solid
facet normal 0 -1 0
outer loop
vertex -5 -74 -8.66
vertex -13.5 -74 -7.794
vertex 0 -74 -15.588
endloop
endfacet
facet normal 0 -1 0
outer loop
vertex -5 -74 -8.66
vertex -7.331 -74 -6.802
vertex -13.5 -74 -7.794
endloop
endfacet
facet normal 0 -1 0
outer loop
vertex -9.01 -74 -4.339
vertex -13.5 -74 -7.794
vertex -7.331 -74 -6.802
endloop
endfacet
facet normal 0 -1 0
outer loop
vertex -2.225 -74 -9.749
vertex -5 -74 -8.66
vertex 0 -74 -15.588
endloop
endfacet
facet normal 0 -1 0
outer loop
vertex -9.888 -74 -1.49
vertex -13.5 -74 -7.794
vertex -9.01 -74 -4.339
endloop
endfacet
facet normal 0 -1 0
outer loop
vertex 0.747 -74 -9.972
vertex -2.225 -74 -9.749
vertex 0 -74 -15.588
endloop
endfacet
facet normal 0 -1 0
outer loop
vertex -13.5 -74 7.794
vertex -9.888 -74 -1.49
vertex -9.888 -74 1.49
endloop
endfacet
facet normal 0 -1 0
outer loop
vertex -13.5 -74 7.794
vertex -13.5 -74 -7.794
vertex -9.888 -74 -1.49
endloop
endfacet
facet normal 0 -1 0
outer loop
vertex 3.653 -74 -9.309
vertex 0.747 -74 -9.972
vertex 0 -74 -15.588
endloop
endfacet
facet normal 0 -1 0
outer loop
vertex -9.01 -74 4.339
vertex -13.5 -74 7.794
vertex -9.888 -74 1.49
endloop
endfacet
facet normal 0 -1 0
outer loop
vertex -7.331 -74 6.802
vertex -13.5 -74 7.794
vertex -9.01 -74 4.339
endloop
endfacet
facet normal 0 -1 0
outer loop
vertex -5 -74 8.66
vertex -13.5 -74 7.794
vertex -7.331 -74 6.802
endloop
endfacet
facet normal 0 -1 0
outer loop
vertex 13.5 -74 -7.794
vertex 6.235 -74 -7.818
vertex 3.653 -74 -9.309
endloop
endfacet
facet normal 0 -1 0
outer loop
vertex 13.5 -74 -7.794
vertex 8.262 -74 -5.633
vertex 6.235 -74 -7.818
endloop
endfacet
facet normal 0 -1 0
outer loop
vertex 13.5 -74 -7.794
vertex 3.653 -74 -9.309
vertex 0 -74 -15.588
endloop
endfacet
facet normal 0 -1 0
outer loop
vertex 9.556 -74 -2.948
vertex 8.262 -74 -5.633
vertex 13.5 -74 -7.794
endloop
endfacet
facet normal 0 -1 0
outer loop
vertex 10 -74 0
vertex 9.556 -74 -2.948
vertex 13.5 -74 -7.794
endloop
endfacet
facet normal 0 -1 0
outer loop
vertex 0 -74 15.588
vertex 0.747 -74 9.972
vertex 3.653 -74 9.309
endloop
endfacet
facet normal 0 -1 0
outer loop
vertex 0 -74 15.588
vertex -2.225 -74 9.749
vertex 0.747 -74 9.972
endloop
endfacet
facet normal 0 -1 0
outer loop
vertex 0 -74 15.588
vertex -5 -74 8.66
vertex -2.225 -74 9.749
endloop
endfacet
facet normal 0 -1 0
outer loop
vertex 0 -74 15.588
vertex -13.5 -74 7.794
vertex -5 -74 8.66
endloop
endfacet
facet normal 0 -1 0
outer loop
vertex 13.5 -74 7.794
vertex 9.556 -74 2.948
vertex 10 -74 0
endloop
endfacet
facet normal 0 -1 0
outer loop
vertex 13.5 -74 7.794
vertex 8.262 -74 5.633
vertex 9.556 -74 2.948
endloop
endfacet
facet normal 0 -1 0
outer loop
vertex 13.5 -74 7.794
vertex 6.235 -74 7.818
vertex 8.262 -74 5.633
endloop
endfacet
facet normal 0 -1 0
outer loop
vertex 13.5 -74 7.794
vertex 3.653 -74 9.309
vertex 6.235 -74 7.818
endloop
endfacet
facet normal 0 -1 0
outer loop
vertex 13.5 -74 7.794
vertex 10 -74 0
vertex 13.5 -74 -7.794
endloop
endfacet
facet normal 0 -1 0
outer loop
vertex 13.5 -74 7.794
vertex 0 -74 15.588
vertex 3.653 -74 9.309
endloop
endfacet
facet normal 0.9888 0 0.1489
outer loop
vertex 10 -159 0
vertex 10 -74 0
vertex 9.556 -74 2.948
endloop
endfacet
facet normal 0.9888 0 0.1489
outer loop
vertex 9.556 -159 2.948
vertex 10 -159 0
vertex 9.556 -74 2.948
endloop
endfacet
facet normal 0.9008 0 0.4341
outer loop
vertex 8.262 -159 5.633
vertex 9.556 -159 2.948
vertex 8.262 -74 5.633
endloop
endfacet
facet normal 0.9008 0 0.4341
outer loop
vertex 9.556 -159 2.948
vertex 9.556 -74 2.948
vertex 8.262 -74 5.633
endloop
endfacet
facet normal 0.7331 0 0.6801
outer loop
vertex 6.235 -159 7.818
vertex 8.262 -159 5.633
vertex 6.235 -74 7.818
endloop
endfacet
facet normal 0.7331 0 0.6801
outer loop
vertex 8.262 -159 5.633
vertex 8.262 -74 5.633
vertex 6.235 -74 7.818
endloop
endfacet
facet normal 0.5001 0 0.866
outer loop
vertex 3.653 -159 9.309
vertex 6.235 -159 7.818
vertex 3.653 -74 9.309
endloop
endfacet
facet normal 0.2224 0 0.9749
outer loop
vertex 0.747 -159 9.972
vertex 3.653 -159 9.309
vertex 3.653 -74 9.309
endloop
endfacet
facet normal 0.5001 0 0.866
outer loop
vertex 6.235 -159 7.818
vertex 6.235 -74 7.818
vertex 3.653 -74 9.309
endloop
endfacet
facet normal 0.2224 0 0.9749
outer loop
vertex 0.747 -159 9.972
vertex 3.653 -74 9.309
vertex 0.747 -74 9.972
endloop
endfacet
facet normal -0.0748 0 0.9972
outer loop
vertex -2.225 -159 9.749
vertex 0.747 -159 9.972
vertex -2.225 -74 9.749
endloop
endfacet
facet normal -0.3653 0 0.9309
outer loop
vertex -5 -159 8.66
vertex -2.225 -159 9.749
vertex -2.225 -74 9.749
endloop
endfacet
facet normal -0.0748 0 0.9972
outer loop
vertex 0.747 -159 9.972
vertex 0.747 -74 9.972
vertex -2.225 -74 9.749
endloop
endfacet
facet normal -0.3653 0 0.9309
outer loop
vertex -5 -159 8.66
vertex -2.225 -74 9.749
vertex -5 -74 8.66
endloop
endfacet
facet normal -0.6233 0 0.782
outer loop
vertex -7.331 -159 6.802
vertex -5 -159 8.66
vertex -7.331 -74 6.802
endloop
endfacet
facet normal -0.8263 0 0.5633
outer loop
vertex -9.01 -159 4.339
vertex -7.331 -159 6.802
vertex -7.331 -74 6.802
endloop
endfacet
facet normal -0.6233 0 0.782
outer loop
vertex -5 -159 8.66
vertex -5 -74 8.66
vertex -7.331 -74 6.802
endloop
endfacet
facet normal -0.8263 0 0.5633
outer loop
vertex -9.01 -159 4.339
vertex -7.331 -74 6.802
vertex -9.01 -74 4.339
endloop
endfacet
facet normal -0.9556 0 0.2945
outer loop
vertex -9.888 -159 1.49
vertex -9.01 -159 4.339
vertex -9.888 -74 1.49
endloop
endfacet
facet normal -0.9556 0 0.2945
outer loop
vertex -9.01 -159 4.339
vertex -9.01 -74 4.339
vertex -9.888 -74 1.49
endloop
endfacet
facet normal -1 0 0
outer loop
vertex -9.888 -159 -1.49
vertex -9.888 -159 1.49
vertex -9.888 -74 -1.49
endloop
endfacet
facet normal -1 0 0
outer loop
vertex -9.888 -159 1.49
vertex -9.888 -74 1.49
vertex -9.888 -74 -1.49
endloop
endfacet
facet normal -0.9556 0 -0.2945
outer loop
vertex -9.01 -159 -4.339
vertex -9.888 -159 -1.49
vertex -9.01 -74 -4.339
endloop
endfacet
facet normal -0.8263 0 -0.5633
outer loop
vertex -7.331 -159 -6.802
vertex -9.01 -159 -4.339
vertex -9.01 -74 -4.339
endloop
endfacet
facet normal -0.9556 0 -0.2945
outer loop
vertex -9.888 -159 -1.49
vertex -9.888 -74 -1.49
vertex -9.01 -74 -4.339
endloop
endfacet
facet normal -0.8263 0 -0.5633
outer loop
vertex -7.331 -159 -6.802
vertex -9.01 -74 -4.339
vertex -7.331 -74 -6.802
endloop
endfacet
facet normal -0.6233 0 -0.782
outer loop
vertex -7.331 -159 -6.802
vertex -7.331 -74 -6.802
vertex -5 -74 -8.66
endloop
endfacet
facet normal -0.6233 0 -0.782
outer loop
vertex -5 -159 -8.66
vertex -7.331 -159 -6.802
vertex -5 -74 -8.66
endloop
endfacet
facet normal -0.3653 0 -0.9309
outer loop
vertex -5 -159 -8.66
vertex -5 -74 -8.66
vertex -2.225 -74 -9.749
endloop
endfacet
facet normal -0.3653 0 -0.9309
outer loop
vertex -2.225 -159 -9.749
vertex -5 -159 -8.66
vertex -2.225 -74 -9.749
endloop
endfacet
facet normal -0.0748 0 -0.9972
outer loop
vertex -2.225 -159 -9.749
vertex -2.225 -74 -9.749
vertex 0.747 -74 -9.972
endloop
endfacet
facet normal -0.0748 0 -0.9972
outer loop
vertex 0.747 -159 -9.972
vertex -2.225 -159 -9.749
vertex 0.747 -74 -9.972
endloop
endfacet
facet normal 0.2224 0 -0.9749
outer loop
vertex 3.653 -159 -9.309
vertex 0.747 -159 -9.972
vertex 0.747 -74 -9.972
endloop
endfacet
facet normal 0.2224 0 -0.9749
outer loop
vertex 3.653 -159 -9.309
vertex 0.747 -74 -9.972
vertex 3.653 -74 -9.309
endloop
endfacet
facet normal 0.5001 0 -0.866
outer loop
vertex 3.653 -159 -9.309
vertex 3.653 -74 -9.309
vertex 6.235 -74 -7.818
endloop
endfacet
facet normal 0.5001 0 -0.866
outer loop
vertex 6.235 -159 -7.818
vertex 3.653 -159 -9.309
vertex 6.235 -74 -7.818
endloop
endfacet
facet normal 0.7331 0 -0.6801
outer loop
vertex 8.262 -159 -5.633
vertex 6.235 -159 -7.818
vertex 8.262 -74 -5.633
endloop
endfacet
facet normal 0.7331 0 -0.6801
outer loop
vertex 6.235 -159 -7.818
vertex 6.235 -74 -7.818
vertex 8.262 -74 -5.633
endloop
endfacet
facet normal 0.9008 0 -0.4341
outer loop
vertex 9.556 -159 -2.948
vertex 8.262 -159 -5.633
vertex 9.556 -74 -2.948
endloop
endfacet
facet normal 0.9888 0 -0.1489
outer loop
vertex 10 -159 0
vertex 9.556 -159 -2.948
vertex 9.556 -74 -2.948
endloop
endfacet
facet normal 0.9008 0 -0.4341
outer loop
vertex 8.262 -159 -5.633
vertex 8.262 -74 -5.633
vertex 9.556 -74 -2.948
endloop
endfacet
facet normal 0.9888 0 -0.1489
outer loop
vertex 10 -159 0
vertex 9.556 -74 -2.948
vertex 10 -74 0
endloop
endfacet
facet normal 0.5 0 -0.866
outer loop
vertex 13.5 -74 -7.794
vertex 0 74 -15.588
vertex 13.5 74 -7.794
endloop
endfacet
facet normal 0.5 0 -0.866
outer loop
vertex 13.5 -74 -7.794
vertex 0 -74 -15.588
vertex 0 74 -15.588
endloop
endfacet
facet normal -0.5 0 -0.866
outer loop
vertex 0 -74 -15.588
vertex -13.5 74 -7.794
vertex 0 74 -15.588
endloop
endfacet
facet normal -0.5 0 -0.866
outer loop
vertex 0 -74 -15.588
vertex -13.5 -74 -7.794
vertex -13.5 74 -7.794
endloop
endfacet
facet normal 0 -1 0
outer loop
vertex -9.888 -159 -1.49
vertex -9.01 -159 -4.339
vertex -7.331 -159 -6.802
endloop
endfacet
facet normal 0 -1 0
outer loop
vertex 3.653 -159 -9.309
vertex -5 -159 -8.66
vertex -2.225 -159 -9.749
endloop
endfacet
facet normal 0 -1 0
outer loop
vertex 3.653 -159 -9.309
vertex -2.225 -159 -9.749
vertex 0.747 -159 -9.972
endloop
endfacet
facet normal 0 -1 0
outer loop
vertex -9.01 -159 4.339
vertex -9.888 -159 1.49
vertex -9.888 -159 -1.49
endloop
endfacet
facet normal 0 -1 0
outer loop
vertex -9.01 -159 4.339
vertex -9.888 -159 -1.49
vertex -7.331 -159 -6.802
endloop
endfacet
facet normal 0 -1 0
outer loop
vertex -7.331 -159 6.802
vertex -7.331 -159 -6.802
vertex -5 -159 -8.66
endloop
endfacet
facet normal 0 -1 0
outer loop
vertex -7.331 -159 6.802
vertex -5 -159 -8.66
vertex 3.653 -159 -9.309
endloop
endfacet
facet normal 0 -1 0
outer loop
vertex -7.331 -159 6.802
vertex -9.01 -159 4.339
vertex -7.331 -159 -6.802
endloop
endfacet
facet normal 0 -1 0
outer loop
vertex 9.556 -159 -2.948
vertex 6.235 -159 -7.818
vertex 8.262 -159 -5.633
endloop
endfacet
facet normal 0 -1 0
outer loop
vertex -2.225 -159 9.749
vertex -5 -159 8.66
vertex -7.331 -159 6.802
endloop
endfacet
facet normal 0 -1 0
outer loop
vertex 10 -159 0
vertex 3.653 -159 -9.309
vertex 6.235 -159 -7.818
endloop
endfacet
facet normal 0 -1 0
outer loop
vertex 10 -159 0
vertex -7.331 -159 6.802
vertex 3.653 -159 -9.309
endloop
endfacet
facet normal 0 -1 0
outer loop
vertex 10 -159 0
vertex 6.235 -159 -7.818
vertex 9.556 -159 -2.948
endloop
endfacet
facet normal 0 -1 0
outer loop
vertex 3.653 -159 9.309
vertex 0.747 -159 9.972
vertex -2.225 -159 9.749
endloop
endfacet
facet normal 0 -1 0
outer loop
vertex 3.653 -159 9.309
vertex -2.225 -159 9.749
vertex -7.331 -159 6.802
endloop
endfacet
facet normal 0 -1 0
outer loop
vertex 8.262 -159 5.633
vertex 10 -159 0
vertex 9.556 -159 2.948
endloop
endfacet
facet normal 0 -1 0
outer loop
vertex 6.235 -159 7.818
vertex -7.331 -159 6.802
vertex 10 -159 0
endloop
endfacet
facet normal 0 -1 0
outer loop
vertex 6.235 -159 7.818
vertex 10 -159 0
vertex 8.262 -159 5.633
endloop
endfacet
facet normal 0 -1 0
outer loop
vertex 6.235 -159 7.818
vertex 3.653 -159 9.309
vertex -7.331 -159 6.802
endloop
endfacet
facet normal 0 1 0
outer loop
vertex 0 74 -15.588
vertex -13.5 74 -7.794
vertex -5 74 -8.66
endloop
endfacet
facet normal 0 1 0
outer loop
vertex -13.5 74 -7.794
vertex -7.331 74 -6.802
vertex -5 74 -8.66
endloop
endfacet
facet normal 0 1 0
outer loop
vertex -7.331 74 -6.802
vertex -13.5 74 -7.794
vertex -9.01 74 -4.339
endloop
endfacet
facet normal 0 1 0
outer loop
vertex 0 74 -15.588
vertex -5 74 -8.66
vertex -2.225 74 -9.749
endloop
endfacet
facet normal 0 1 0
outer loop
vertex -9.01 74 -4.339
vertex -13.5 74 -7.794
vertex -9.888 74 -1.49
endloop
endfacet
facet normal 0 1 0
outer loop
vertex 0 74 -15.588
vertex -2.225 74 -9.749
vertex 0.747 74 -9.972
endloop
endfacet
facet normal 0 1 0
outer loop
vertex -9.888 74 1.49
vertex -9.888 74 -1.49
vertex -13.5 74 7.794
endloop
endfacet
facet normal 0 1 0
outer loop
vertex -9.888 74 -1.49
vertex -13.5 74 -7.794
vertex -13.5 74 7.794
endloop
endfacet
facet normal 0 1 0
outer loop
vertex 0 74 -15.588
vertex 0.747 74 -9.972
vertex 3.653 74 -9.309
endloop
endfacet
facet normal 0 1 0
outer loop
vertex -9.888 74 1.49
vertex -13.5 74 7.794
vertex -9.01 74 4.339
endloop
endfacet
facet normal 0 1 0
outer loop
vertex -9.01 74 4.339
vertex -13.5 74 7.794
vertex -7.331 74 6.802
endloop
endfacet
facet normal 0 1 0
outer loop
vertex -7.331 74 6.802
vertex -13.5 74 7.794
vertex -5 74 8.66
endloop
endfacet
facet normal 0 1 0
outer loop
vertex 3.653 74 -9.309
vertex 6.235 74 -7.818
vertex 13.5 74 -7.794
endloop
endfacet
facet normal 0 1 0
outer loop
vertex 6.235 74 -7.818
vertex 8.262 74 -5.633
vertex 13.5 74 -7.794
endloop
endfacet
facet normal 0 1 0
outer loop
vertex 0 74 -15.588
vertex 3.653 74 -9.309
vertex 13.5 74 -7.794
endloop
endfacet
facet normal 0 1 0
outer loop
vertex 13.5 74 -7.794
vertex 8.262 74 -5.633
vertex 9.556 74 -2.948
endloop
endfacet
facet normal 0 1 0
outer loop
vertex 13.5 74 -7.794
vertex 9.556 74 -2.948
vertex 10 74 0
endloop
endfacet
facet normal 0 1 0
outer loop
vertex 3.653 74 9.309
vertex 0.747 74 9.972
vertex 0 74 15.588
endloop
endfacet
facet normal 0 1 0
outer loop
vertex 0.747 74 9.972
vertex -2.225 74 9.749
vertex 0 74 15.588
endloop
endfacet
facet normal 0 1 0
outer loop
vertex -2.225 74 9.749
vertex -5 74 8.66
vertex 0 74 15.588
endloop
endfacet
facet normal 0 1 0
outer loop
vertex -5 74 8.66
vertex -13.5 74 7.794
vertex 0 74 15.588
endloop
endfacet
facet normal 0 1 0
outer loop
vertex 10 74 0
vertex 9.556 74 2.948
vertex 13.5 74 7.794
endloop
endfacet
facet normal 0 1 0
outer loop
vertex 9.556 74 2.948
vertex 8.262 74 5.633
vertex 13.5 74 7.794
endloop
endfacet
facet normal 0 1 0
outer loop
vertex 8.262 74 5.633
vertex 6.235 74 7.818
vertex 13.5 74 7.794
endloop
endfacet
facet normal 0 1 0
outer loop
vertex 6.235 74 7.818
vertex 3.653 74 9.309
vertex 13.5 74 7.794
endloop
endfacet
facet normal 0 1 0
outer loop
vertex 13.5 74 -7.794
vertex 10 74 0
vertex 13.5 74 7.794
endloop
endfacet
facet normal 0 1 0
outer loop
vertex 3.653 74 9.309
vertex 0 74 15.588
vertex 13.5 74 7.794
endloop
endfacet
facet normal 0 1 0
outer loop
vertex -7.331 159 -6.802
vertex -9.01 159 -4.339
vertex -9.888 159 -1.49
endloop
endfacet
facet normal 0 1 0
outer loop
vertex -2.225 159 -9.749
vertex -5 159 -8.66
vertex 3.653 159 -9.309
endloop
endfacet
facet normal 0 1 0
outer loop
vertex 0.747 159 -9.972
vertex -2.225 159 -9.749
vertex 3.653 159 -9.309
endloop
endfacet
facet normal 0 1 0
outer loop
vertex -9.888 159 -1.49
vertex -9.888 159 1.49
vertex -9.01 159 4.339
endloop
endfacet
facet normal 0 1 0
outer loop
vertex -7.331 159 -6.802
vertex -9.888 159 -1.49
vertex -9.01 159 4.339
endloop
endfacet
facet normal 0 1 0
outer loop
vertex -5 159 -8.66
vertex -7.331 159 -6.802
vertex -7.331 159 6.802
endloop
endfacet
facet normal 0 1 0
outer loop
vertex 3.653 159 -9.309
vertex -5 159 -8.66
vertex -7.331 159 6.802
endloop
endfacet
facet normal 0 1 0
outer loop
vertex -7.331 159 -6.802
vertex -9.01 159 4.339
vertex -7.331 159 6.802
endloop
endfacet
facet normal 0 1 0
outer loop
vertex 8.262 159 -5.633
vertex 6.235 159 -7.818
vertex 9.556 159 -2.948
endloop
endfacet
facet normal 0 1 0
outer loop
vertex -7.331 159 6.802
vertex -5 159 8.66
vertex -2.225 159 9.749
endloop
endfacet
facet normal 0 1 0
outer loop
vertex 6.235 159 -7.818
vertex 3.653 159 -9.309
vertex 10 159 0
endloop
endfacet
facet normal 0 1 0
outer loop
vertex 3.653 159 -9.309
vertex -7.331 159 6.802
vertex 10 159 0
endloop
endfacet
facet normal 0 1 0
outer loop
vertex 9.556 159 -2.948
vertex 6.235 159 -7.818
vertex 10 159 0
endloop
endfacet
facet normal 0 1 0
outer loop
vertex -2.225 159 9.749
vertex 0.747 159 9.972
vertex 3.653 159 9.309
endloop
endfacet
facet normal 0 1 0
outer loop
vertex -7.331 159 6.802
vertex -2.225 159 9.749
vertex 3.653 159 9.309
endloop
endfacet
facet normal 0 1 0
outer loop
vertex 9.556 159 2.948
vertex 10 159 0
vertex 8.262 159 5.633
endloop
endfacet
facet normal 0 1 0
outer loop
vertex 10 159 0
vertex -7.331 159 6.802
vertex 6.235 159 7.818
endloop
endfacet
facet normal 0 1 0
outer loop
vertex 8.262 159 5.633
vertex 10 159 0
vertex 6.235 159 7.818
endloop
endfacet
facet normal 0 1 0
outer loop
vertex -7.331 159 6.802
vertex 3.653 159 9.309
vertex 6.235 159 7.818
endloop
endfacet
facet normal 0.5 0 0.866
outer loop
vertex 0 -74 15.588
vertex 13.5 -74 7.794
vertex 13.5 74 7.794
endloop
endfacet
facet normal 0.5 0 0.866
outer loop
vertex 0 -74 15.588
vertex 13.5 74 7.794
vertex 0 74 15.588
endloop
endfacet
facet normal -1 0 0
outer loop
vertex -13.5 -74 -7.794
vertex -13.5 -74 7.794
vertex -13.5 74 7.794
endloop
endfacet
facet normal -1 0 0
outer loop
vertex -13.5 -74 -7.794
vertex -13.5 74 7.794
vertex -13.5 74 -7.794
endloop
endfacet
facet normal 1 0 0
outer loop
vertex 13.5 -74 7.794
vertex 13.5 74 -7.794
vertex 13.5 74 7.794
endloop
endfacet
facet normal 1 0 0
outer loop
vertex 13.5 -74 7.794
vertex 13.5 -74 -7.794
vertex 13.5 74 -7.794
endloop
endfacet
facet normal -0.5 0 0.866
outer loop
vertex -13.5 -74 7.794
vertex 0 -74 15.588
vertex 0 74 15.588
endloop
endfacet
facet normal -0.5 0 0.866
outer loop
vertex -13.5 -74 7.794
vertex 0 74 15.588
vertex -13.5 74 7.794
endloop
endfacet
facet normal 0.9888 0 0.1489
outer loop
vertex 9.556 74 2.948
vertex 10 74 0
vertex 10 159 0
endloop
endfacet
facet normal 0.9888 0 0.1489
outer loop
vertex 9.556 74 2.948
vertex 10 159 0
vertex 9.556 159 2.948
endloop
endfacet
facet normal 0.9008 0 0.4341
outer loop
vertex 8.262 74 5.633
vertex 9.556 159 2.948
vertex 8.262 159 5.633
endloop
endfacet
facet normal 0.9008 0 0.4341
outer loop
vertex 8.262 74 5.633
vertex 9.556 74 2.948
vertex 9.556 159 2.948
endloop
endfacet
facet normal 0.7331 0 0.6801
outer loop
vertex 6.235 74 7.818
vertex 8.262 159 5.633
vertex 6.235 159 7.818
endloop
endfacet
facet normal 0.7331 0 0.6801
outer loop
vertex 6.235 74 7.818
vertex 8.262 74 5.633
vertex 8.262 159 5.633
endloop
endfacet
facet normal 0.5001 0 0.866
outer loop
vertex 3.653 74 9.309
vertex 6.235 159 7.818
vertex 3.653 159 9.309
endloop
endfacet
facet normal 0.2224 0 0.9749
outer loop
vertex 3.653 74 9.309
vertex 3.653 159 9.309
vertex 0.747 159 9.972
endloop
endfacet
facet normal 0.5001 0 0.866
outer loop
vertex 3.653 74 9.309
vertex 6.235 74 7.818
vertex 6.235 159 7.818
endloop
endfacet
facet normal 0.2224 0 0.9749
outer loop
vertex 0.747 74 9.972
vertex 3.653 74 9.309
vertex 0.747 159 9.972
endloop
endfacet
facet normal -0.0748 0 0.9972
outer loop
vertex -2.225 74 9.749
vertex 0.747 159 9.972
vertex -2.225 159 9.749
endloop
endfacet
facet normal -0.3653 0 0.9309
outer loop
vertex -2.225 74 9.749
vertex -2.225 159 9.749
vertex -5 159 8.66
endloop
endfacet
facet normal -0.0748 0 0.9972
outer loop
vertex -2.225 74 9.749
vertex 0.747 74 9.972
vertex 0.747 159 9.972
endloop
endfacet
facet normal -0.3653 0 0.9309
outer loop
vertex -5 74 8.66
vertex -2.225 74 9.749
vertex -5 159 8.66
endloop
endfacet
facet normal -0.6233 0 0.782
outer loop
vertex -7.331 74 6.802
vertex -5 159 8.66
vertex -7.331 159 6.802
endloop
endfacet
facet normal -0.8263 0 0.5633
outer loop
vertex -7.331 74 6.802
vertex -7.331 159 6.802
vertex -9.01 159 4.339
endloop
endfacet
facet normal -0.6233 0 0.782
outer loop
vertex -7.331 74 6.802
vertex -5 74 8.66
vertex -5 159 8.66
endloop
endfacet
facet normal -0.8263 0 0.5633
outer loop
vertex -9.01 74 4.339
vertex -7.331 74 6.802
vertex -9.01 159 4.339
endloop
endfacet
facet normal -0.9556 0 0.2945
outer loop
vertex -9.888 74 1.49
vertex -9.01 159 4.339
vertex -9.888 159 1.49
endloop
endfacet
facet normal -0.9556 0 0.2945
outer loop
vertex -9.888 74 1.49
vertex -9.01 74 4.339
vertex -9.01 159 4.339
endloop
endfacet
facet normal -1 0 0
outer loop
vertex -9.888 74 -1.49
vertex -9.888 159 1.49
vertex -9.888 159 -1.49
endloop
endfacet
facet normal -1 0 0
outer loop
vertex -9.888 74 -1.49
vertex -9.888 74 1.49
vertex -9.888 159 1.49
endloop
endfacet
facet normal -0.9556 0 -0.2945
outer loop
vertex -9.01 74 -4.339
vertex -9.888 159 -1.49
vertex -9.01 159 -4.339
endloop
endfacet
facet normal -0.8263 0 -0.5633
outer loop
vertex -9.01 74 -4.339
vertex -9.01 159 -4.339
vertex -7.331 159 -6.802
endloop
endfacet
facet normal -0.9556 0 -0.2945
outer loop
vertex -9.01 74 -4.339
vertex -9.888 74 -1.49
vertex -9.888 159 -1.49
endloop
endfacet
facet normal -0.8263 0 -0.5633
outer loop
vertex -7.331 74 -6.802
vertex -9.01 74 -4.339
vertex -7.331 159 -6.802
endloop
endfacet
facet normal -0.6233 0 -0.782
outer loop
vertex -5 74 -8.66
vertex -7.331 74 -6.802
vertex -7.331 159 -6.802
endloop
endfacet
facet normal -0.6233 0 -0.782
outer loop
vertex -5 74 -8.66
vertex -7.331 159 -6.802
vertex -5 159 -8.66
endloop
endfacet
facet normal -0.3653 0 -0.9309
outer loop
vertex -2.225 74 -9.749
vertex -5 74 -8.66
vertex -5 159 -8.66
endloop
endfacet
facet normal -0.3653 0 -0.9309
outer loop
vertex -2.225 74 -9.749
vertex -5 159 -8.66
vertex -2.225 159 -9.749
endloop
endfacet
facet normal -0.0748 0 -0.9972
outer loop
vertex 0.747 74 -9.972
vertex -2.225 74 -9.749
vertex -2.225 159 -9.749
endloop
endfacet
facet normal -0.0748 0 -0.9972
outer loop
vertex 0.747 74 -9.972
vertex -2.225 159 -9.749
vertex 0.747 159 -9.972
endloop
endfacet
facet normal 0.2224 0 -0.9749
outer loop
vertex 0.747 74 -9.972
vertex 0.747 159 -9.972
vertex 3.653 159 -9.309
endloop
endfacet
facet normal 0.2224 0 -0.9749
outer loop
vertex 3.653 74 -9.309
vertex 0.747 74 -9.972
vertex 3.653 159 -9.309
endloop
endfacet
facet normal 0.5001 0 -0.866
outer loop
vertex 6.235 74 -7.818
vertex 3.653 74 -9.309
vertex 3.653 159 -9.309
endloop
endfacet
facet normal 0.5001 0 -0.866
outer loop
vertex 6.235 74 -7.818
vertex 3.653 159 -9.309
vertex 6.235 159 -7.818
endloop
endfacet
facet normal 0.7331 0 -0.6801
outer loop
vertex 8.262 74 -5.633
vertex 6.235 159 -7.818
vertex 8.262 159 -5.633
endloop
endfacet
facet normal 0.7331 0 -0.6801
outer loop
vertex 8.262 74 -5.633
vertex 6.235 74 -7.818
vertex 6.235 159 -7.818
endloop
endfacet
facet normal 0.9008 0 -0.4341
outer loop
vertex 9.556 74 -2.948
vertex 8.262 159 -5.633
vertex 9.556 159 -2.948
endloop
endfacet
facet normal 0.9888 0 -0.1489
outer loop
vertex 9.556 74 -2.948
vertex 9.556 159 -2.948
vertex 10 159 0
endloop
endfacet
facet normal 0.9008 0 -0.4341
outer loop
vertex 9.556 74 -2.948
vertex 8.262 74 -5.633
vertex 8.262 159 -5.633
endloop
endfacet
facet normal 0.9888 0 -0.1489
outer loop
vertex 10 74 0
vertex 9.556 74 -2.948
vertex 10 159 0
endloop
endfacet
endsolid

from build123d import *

# Parameters (mm, degrees)
F1_DEPTH = 74
F2_R     = 10
F3_DEPTH = 85


with BuildPart() as f1:
    # F0 (on Front) → F1 (new body)
    with BuildSketch(Plane.XZ):
        Polygon((13.5, -7.794229), (13.5, 7.794229), (0, 15.588457), (-13.5, 7.794229), (-13.5, -7.794229), (0, -15.588457), align=None)
    extrude(amount=F1_DEPTH)

    # F2 (on face) → F3 (join)
    with BuildSketch(Plane.XZ.offset(74)):
        Circle(F2_R)
    extrude(amount=F3_DEPTH)

    # F4: F1 across face


with BuildPart() as f1_1:
    add(f1.part)
    add(f1.part.mirror(Plane(origin=(0, 0, 0), x_dir=(1, 0, 0), z_dir=(0, 1, 0))))


solid = f1_1.part
